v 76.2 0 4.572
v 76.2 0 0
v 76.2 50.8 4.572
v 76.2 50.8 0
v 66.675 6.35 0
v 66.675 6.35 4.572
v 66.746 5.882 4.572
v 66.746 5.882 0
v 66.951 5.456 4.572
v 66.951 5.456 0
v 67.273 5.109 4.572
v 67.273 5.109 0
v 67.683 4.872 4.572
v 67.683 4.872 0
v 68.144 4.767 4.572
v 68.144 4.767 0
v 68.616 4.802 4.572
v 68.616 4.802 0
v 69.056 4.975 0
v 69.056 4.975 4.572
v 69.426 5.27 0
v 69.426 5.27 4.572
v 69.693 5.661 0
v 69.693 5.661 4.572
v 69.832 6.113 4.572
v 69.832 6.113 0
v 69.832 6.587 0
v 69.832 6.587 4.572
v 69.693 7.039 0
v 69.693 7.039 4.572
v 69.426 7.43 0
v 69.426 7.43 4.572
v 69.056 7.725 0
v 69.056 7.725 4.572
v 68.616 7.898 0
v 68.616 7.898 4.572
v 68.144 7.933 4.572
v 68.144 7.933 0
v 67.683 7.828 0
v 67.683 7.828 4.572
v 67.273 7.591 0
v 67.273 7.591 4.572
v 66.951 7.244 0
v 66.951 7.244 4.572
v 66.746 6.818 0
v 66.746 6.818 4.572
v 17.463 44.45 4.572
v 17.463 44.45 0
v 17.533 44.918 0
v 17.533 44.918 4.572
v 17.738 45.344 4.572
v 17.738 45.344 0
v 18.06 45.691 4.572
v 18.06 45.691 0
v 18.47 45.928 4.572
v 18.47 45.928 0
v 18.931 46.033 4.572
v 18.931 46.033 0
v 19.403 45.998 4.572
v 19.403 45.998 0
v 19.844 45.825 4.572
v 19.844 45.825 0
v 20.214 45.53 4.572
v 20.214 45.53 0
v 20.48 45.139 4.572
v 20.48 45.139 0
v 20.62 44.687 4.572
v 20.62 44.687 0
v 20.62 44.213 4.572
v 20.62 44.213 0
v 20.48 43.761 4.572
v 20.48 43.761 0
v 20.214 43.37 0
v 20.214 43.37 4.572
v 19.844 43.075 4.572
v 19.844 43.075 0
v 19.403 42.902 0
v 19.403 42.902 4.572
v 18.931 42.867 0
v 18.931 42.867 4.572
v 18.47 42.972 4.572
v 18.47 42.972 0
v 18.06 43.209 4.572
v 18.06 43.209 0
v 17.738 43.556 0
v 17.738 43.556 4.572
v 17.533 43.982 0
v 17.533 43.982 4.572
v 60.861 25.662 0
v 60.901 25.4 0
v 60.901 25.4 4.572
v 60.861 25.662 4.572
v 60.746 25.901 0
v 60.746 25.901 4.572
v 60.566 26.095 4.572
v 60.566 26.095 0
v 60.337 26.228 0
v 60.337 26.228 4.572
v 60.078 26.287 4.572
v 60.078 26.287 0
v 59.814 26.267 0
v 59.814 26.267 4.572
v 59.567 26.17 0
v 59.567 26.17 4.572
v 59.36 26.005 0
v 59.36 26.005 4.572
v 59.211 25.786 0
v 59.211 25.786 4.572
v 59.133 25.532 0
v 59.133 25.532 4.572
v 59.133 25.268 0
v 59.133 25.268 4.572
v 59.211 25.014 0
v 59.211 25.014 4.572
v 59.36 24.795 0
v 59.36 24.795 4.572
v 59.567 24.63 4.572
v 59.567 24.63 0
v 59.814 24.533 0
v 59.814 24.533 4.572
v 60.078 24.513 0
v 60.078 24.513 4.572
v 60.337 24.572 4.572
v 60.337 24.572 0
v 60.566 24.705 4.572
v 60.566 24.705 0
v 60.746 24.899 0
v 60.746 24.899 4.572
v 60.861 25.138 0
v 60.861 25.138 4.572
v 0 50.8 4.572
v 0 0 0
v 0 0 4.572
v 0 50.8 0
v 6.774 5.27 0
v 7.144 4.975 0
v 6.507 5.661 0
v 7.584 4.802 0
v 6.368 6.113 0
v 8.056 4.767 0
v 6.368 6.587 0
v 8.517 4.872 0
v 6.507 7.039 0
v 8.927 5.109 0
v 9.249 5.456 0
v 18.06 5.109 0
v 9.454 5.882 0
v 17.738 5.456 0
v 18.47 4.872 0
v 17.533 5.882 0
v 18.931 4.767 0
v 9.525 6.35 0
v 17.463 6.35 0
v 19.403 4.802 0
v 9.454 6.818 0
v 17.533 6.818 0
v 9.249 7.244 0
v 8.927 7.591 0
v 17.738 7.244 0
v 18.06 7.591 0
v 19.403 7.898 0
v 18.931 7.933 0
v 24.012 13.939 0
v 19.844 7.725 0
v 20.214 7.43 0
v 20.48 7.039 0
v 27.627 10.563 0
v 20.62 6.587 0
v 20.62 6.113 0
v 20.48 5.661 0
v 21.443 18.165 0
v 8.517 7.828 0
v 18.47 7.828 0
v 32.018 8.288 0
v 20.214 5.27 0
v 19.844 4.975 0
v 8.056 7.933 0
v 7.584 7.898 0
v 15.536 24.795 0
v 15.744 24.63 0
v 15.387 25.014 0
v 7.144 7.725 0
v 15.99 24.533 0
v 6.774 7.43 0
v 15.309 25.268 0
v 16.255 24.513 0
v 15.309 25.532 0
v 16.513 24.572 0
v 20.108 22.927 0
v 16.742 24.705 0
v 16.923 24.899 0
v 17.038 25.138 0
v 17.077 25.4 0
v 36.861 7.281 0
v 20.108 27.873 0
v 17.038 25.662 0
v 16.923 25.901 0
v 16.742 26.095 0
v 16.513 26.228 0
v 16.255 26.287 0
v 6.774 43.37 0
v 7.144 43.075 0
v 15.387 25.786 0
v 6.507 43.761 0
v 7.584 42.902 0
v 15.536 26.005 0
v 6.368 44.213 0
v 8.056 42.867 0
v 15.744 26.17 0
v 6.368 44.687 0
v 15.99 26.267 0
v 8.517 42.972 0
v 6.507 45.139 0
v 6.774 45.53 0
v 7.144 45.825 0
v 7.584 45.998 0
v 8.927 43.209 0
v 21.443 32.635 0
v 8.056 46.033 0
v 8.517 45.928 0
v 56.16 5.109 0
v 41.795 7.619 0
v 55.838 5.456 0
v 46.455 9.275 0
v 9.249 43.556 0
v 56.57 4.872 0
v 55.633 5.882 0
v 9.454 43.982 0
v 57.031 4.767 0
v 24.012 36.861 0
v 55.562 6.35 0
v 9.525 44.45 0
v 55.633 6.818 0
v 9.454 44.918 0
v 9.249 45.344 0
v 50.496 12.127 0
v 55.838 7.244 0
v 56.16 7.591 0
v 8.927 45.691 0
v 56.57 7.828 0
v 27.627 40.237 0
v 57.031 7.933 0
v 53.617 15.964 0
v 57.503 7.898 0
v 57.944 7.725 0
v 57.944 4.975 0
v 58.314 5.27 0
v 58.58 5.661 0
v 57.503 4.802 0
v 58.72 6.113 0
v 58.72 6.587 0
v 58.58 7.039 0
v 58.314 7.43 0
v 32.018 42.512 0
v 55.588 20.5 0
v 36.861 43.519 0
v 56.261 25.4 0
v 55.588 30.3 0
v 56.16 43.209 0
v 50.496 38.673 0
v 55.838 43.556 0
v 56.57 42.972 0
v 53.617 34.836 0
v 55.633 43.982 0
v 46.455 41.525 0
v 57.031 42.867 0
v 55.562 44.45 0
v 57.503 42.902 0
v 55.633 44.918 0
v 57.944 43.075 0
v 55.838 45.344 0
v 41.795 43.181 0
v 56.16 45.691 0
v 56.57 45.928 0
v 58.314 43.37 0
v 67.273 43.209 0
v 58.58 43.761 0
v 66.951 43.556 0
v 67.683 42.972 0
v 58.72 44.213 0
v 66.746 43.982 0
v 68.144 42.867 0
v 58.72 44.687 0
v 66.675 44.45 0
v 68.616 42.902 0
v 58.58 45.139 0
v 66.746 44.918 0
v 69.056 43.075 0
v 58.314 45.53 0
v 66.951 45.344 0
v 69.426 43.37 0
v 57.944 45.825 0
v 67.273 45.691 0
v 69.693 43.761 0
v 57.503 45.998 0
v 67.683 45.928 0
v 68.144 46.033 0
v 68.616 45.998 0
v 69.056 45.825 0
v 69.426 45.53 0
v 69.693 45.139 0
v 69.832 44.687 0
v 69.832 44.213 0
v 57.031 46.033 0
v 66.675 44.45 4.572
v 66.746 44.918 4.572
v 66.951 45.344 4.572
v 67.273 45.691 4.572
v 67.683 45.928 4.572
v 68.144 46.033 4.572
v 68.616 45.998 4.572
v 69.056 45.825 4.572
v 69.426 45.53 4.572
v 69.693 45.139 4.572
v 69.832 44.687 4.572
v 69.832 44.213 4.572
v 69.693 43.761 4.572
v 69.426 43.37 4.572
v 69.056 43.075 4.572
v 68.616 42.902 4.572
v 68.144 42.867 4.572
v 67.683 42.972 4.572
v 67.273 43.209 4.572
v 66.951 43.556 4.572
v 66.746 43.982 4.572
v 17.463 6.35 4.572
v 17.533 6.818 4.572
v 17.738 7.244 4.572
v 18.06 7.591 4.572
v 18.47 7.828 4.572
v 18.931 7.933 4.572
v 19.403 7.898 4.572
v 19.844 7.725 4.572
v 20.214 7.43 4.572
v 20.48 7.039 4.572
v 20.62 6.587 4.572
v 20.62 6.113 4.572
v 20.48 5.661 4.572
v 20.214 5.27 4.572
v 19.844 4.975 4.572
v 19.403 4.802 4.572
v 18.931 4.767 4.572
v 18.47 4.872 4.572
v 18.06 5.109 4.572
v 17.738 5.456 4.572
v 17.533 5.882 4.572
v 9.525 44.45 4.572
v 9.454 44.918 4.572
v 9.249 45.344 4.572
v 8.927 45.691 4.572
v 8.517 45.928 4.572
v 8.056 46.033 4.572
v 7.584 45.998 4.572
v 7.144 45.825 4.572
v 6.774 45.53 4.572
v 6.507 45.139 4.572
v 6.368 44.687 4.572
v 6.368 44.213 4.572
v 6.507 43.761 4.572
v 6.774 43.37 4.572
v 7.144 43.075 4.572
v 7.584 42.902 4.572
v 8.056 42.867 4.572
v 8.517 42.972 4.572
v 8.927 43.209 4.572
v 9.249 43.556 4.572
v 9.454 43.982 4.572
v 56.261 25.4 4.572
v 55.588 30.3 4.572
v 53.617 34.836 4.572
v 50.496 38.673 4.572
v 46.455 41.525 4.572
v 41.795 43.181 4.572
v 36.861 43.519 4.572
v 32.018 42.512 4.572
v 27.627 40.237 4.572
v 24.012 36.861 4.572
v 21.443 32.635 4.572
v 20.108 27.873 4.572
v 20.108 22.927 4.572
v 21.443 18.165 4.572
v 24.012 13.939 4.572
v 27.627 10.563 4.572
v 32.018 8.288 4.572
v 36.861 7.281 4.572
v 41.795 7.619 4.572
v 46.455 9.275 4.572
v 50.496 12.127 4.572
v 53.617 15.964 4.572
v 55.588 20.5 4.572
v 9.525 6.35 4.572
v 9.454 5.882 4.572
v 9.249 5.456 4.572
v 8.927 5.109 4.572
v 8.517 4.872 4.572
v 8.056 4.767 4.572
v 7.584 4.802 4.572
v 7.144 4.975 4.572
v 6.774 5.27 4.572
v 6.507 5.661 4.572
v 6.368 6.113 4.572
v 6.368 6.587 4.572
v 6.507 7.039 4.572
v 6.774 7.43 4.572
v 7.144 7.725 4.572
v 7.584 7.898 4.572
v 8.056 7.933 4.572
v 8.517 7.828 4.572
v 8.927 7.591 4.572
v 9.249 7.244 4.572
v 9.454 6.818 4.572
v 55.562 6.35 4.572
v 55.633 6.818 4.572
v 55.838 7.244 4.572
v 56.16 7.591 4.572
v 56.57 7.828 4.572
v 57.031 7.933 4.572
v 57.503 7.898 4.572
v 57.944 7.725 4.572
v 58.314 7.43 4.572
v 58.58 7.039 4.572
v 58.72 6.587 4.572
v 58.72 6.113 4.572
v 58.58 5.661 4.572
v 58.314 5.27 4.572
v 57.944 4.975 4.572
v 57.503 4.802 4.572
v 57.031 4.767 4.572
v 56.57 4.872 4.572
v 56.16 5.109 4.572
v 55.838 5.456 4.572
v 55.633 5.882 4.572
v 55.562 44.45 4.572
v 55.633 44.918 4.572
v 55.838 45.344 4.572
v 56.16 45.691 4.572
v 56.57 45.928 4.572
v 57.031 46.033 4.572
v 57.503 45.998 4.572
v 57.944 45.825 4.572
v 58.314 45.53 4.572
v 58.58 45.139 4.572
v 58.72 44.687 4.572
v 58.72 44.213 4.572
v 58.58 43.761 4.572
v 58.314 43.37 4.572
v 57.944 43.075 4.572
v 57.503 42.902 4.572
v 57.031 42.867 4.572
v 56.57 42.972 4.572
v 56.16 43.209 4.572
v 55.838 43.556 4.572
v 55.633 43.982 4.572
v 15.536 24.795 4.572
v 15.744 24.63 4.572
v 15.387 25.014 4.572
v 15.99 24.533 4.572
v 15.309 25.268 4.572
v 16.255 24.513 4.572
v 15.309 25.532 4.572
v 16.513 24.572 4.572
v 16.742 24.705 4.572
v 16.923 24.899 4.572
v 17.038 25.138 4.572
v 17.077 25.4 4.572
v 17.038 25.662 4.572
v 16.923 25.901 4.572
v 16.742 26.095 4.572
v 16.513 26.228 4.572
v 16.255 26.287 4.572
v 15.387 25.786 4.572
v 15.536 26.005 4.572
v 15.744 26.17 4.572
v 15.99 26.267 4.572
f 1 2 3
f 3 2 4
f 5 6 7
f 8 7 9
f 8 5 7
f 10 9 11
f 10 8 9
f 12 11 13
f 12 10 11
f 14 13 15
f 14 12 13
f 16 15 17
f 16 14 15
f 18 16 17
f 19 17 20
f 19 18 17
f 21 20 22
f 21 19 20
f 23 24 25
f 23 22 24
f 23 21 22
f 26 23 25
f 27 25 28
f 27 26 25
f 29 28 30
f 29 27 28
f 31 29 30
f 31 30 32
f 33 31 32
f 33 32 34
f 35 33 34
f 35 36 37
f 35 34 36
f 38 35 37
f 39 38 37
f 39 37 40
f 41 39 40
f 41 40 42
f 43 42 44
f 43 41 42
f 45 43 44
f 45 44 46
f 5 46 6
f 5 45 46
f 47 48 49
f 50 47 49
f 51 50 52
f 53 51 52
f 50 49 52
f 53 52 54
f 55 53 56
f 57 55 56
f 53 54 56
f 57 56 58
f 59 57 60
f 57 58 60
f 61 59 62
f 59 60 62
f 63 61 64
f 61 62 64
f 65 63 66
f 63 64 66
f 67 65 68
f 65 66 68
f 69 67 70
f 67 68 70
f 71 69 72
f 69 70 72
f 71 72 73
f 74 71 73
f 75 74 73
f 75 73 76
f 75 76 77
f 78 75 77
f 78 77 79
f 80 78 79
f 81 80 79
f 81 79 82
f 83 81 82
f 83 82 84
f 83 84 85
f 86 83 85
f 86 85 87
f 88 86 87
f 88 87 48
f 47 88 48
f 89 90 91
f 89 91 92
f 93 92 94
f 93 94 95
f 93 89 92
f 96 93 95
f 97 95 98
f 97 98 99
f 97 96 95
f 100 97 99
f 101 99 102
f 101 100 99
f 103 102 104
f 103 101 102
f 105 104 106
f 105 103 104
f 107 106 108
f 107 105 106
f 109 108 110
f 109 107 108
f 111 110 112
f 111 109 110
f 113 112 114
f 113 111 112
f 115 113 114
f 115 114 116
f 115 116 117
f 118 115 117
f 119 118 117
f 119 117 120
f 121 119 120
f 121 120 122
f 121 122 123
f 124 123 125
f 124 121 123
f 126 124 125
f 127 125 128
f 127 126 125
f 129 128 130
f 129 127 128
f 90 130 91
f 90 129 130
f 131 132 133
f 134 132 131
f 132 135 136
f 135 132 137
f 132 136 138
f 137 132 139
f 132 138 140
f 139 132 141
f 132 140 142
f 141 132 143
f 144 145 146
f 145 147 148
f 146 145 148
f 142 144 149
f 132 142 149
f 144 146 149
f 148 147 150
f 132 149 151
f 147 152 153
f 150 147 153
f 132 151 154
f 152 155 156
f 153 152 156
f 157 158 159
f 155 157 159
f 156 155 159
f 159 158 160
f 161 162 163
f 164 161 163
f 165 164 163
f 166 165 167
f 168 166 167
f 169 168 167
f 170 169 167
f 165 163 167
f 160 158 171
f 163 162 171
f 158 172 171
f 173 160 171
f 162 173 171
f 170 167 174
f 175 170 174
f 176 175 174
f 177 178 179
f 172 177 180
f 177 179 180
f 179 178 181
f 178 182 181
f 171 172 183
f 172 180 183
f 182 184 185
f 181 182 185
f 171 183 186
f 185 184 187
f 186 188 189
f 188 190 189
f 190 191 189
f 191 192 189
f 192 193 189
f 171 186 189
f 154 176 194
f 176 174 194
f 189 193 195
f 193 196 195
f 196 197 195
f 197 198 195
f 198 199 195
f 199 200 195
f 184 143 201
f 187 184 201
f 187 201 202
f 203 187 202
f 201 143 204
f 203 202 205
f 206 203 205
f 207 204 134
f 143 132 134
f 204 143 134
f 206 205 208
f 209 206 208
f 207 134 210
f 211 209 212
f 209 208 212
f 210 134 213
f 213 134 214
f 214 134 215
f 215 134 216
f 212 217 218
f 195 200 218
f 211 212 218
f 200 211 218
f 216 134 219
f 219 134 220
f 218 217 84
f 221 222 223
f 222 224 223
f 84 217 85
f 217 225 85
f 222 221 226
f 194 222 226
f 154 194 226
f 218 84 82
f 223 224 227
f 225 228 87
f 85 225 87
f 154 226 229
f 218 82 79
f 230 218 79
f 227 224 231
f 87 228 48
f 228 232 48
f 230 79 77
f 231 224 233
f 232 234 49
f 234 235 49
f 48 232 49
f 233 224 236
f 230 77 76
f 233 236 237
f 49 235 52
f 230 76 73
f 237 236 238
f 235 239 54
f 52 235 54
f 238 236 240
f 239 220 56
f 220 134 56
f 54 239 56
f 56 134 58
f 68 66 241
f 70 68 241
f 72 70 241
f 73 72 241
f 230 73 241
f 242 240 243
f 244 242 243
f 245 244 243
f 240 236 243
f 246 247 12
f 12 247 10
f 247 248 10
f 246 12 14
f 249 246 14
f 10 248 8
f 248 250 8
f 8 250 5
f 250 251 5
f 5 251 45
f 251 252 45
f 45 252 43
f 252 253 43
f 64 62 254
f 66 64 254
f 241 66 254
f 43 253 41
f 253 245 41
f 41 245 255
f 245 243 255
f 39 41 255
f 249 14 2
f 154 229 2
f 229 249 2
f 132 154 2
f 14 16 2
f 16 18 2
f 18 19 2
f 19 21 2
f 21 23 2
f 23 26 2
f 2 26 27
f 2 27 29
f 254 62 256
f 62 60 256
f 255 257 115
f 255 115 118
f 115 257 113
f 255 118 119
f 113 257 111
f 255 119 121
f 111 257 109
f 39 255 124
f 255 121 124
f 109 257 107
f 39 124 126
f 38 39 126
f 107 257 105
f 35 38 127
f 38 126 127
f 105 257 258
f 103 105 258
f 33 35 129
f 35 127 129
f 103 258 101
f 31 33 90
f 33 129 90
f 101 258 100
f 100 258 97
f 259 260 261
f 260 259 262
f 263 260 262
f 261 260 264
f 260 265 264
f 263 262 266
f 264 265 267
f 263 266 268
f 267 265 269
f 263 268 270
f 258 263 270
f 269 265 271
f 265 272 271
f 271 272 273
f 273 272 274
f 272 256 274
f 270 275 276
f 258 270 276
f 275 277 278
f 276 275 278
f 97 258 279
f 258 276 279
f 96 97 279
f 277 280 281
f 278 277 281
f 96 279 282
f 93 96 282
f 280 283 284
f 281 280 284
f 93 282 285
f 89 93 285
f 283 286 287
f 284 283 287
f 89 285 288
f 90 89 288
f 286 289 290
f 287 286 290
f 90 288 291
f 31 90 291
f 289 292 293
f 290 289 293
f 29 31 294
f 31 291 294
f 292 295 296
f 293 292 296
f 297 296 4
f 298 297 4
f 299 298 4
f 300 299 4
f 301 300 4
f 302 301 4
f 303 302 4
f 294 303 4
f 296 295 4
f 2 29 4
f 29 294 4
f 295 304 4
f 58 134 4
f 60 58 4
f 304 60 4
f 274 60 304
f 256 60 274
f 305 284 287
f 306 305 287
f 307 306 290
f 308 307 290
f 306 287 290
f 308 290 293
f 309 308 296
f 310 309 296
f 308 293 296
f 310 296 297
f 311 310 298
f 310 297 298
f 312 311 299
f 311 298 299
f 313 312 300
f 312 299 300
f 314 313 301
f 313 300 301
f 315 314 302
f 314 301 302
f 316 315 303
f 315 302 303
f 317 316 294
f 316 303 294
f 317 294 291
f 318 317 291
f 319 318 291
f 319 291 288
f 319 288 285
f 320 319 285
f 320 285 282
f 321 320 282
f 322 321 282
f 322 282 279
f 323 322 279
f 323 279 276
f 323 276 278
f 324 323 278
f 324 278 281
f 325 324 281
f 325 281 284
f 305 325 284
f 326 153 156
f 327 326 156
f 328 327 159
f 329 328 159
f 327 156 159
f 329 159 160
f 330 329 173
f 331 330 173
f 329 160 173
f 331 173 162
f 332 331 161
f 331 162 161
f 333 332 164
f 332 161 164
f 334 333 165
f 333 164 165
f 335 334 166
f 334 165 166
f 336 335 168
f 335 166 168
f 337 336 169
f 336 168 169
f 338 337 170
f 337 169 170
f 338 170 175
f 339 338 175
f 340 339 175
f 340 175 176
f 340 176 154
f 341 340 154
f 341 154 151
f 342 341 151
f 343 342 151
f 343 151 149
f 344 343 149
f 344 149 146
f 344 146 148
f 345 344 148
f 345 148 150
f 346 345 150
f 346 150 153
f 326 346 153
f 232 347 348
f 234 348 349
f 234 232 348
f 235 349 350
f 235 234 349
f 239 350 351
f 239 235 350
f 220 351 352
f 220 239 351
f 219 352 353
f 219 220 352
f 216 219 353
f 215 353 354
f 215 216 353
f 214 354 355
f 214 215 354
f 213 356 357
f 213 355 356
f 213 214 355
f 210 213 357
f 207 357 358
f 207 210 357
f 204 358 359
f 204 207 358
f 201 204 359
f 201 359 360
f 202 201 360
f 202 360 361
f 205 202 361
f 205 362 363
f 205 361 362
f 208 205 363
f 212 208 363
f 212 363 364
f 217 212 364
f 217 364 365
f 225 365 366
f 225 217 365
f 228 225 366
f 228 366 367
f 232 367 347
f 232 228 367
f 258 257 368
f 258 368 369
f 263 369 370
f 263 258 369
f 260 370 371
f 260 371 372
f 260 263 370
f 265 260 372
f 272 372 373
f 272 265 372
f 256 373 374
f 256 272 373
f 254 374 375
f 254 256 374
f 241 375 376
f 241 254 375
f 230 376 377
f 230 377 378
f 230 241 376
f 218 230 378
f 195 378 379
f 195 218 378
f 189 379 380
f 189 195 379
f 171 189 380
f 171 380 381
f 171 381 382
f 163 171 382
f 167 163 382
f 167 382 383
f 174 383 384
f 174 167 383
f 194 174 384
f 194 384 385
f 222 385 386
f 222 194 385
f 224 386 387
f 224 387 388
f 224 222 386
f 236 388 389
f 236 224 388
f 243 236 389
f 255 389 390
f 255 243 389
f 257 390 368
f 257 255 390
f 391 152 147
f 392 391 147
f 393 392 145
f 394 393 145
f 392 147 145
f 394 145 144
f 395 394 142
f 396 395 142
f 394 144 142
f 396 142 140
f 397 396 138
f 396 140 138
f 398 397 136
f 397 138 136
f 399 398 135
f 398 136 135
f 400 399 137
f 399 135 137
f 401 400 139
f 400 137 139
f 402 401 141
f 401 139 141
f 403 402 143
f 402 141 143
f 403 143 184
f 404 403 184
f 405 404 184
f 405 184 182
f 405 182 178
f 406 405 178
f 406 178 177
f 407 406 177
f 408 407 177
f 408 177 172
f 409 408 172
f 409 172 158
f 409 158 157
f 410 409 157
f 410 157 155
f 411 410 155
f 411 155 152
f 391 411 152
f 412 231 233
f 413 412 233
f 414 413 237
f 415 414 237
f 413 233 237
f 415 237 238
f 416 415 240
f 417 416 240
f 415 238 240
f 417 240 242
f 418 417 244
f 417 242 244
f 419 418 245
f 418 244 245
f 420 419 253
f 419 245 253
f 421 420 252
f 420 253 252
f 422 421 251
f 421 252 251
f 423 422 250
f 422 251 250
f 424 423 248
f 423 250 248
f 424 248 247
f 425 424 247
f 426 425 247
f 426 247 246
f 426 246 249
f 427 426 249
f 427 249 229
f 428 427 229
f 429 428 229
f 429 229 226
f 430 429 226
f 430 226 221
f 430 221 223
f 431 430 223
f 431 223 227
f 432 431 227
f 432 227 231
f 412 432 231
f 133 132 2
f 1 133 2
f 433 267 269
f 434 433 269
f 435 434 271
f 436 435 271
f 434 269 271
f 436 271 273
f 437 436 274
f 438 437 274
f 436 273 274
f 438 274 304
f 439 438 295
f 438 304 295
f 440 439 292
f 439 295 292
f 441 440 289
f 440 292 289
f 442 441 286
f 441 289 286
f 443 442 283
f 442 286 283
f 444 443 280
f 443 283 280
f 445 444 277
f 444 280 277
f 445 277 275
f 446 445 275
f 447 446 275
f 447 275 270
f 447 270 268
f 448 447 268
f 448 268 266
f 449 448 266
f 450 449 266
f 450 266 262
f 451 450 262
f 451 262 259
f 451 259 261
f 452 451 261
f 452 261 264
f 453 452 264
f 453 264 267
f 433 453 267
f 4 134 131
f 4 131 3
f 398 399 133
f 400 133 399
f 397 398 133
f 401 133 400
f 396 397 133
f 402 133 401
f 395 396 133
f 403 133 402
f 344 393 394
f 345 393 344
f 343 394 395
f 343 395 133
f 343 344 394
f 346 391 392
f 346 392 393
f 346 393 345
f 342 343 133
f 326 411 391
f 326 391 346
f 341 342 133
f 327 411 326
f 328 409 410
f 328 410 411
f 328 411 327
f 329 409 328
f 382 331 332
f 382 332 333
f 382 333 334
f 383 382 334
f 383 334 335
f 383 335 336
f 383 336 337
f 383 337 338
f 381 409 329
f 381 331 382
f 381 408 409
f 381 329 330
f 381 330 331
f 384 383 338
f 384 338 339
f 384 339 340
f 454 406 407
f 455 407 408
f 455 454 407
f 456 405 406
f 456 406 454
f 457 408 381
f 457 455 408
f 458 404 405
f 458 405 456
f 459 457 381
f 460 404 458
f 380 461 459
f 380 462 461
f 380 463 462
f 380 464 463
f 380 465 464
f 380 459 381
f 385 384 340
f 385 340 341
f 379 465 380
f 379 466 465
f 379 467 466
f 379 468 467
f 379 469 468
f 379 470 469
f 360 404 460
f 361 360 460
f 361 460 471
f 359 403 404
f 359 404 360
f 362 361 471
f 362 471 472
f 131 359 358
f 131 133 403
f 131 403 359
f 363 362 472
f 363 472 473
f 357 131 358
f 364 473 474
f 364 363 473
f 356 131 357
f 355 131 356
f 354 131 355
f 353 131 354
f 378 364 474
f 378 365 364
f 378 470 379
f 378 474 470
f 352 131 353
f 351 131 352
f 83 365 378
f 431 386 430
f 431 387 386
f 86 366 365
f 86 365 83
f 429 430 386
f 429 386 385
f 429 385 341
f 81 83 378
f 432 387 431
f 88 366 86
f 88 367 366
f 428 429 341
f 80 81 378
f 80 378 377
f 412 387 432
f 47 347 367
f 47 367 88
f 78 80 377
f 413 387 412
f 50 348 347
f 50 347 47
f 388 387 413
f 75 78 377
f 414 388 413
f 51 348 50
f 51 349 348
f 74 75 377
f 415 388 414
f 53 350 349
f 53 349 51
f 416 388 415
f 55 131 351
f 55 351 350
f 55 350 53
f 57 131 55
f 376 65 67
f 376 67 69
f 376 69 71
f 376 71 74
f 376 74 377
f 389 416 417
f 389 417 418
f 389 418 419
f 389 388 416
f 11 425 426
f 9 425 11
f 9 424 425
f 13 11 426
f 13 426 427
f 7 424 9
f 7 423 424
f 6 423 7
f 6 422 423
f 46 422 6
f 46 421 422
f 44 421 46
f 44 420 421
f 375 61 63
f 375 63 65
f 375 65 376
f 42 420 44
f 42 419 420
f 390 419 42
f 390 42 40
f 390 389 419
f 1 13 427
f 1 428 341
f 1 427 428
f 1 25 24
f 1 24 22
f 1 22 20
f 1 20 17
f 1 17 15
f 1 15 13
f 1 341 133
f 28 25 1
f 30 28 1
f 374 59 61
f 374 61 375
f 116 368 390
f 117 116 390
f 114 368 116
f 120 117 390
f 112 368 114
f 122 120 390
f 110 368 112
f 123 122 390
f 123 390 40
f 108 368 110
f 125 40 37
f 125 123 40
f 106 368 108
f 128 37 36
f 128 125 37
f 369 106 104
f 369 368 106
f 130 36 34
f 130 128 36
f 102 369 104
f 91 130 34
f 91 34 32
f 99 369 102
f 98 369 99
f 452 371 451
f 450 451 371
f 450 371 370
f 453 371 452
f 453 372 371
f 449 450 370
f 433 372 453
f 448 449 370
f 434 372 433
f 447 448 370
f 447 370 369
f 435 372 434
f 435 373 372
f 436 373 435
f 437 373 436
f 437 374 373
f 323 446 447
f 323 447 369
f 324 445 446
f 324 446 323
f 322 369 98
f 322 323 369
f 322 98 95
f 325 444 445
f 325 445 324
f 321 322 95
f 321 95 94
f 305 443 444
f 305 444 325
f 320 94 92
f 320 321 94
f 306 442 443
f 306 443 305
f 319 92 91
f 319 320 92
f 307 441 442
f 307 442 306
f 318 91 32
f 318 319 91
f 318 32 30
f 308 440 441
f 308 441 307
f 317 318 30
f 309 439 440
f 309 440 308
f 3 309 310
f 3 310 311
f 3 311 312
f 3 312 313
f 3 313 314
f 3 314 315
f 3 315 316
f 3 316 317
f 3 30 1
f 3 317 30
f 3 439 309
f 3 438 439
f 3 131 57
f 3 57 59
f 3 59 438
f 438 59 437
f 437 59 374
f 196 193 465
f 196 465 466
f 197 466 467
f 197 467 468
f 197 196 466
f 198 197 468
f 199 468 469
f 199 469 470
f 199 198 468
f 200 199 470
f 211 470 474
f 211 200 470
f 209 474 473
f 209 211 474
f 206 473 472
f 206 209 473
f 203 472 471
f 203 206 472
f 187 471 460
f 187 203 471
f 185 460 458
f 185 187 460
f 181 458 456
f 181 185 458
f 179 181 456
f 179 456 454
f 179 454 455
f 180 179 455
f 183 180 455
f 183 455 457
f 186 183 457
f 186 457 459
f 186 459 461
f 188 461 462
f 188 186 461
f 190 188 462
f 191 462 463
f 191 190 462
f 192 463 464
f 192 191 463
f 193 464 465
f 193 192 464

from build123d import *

# Parameters (mm, degrees)
SKETCH1_W               = 76.2
SKETCH1_H               = 50.8
BOSS_EXTRUDE1_DEPTH     = 4.572
CAVITY5_OUTLINE_R       = 18.161
CAVITY5_OUTLINE_R_2     = 0.889
CAVITY5_DEPTH           = 4.572
SKETCH3_R               = 1.5875
CUT_EXTRUDE1_DEPTH      = 92.695055396
MIRROR2_COPY_1_SKETCH_R = 1.5875
MIRROR2_COPY_1_DEPTH    = 92.695055396
SKETCH4_R               = 1.5875
CUT_EXTRUDE2_DEPTH      = 92.695055396


# Read off the part's stored shape, not the designer's step: Cavity5
with BuildPart() as part:
    # Sketch1 → Boss-Extrude1 (new body)
    with BuildSketch(Plane.XY):
        with Locations((38.1, 25.4)):
            Rectangle(SKETCH1_W, SKETCH1_H)
    extrude(amount=BOSS_EXTRUDE1_DEPTH)

    # Cavity5 outline → Cavity5 (cut)
    with BuildSketch(Plane.XY):
        with Locations((38.1, 25.4)):
            Circle(CAVITY5_OUTLINE_R)
        with Locations((16.188175065, 25.4)):
            Circle(CAVITY5_OUTLINE_R_2)
        with Locations((60.011824935, 25.4)):
            Circle(CAVITY5_OUTLINE_R_2)
    extrude(amount=CAVITY5_DEPTH, mode=Mode.SUBTRACT)

    # Sketch3 → Cut-Extrude1 (cut, through all)
    with BuildSketch(Plane(origin=(0, 0, 0), x_dir=(-1, 0, 0), z_dir=(0, 0, -1))):
        with Locations((-68.2625, 44.45)):
            Circle(SKETCH3_R)
    cut_extrude1 = extrude(amount=-CUT_EXTRUDE1_DEPTH, mode=Mode.SUBTRACT)

    # Mirror1: Cut-Extrude1 across plane
    add(cut_extrude1.mirror(Plane(origin=(38.1, 0, 0), x_dir=(0, 0, 1), z_dir=(1, 0, 0))), mode=Mode.SUBTRACT)

    # Mirror2: Cut-Extrude1 across plane
    add(cut_extrude1.mirror(Plane.ZX.offset(25.4)), mode=Mode.SUBTRACT)

    # Mirror2 copy 1 sketch → Mirror2 copy 1 (cut, through all)
    with BuildSketch(Plane(origin=(76.2, 50.8, 0), x_dir=(1, 0, 0), z_dir=(0, 0, -1))):
        with Locations((-68.2625, 44.45)):
            Circle(MIRROR2_COPY_1_SKETCH_R)
    extrude(amount=-MIRROR2_COPY_1_DEPTH, mode=Mode.SUBTRACT)

    # Sketch4 → Cut-Extrude2 (cut, through all)
    with BuildSketch(Plane(origin=(0, 0, 0), x_dir=(-1, 0, 0), z_dir=(0, 0, -1))):
        with Locations((-19.05, 44.45)):
            Circle(SKETCH4_R)
        with Locations((-57.15, 44.45)):
            Circle(SKETCH4_R)
        with Locations((-57.15, 6.35)):
            Circle(SKETCH4_R)
        with Locations((-19.05, 6.35)):
            Circle(SKETCH4_R)
    extrude(amount=-CUT_EXTRUDE2_DEPTH, mode=Mode.SUBTRACT)


solid = part.part
